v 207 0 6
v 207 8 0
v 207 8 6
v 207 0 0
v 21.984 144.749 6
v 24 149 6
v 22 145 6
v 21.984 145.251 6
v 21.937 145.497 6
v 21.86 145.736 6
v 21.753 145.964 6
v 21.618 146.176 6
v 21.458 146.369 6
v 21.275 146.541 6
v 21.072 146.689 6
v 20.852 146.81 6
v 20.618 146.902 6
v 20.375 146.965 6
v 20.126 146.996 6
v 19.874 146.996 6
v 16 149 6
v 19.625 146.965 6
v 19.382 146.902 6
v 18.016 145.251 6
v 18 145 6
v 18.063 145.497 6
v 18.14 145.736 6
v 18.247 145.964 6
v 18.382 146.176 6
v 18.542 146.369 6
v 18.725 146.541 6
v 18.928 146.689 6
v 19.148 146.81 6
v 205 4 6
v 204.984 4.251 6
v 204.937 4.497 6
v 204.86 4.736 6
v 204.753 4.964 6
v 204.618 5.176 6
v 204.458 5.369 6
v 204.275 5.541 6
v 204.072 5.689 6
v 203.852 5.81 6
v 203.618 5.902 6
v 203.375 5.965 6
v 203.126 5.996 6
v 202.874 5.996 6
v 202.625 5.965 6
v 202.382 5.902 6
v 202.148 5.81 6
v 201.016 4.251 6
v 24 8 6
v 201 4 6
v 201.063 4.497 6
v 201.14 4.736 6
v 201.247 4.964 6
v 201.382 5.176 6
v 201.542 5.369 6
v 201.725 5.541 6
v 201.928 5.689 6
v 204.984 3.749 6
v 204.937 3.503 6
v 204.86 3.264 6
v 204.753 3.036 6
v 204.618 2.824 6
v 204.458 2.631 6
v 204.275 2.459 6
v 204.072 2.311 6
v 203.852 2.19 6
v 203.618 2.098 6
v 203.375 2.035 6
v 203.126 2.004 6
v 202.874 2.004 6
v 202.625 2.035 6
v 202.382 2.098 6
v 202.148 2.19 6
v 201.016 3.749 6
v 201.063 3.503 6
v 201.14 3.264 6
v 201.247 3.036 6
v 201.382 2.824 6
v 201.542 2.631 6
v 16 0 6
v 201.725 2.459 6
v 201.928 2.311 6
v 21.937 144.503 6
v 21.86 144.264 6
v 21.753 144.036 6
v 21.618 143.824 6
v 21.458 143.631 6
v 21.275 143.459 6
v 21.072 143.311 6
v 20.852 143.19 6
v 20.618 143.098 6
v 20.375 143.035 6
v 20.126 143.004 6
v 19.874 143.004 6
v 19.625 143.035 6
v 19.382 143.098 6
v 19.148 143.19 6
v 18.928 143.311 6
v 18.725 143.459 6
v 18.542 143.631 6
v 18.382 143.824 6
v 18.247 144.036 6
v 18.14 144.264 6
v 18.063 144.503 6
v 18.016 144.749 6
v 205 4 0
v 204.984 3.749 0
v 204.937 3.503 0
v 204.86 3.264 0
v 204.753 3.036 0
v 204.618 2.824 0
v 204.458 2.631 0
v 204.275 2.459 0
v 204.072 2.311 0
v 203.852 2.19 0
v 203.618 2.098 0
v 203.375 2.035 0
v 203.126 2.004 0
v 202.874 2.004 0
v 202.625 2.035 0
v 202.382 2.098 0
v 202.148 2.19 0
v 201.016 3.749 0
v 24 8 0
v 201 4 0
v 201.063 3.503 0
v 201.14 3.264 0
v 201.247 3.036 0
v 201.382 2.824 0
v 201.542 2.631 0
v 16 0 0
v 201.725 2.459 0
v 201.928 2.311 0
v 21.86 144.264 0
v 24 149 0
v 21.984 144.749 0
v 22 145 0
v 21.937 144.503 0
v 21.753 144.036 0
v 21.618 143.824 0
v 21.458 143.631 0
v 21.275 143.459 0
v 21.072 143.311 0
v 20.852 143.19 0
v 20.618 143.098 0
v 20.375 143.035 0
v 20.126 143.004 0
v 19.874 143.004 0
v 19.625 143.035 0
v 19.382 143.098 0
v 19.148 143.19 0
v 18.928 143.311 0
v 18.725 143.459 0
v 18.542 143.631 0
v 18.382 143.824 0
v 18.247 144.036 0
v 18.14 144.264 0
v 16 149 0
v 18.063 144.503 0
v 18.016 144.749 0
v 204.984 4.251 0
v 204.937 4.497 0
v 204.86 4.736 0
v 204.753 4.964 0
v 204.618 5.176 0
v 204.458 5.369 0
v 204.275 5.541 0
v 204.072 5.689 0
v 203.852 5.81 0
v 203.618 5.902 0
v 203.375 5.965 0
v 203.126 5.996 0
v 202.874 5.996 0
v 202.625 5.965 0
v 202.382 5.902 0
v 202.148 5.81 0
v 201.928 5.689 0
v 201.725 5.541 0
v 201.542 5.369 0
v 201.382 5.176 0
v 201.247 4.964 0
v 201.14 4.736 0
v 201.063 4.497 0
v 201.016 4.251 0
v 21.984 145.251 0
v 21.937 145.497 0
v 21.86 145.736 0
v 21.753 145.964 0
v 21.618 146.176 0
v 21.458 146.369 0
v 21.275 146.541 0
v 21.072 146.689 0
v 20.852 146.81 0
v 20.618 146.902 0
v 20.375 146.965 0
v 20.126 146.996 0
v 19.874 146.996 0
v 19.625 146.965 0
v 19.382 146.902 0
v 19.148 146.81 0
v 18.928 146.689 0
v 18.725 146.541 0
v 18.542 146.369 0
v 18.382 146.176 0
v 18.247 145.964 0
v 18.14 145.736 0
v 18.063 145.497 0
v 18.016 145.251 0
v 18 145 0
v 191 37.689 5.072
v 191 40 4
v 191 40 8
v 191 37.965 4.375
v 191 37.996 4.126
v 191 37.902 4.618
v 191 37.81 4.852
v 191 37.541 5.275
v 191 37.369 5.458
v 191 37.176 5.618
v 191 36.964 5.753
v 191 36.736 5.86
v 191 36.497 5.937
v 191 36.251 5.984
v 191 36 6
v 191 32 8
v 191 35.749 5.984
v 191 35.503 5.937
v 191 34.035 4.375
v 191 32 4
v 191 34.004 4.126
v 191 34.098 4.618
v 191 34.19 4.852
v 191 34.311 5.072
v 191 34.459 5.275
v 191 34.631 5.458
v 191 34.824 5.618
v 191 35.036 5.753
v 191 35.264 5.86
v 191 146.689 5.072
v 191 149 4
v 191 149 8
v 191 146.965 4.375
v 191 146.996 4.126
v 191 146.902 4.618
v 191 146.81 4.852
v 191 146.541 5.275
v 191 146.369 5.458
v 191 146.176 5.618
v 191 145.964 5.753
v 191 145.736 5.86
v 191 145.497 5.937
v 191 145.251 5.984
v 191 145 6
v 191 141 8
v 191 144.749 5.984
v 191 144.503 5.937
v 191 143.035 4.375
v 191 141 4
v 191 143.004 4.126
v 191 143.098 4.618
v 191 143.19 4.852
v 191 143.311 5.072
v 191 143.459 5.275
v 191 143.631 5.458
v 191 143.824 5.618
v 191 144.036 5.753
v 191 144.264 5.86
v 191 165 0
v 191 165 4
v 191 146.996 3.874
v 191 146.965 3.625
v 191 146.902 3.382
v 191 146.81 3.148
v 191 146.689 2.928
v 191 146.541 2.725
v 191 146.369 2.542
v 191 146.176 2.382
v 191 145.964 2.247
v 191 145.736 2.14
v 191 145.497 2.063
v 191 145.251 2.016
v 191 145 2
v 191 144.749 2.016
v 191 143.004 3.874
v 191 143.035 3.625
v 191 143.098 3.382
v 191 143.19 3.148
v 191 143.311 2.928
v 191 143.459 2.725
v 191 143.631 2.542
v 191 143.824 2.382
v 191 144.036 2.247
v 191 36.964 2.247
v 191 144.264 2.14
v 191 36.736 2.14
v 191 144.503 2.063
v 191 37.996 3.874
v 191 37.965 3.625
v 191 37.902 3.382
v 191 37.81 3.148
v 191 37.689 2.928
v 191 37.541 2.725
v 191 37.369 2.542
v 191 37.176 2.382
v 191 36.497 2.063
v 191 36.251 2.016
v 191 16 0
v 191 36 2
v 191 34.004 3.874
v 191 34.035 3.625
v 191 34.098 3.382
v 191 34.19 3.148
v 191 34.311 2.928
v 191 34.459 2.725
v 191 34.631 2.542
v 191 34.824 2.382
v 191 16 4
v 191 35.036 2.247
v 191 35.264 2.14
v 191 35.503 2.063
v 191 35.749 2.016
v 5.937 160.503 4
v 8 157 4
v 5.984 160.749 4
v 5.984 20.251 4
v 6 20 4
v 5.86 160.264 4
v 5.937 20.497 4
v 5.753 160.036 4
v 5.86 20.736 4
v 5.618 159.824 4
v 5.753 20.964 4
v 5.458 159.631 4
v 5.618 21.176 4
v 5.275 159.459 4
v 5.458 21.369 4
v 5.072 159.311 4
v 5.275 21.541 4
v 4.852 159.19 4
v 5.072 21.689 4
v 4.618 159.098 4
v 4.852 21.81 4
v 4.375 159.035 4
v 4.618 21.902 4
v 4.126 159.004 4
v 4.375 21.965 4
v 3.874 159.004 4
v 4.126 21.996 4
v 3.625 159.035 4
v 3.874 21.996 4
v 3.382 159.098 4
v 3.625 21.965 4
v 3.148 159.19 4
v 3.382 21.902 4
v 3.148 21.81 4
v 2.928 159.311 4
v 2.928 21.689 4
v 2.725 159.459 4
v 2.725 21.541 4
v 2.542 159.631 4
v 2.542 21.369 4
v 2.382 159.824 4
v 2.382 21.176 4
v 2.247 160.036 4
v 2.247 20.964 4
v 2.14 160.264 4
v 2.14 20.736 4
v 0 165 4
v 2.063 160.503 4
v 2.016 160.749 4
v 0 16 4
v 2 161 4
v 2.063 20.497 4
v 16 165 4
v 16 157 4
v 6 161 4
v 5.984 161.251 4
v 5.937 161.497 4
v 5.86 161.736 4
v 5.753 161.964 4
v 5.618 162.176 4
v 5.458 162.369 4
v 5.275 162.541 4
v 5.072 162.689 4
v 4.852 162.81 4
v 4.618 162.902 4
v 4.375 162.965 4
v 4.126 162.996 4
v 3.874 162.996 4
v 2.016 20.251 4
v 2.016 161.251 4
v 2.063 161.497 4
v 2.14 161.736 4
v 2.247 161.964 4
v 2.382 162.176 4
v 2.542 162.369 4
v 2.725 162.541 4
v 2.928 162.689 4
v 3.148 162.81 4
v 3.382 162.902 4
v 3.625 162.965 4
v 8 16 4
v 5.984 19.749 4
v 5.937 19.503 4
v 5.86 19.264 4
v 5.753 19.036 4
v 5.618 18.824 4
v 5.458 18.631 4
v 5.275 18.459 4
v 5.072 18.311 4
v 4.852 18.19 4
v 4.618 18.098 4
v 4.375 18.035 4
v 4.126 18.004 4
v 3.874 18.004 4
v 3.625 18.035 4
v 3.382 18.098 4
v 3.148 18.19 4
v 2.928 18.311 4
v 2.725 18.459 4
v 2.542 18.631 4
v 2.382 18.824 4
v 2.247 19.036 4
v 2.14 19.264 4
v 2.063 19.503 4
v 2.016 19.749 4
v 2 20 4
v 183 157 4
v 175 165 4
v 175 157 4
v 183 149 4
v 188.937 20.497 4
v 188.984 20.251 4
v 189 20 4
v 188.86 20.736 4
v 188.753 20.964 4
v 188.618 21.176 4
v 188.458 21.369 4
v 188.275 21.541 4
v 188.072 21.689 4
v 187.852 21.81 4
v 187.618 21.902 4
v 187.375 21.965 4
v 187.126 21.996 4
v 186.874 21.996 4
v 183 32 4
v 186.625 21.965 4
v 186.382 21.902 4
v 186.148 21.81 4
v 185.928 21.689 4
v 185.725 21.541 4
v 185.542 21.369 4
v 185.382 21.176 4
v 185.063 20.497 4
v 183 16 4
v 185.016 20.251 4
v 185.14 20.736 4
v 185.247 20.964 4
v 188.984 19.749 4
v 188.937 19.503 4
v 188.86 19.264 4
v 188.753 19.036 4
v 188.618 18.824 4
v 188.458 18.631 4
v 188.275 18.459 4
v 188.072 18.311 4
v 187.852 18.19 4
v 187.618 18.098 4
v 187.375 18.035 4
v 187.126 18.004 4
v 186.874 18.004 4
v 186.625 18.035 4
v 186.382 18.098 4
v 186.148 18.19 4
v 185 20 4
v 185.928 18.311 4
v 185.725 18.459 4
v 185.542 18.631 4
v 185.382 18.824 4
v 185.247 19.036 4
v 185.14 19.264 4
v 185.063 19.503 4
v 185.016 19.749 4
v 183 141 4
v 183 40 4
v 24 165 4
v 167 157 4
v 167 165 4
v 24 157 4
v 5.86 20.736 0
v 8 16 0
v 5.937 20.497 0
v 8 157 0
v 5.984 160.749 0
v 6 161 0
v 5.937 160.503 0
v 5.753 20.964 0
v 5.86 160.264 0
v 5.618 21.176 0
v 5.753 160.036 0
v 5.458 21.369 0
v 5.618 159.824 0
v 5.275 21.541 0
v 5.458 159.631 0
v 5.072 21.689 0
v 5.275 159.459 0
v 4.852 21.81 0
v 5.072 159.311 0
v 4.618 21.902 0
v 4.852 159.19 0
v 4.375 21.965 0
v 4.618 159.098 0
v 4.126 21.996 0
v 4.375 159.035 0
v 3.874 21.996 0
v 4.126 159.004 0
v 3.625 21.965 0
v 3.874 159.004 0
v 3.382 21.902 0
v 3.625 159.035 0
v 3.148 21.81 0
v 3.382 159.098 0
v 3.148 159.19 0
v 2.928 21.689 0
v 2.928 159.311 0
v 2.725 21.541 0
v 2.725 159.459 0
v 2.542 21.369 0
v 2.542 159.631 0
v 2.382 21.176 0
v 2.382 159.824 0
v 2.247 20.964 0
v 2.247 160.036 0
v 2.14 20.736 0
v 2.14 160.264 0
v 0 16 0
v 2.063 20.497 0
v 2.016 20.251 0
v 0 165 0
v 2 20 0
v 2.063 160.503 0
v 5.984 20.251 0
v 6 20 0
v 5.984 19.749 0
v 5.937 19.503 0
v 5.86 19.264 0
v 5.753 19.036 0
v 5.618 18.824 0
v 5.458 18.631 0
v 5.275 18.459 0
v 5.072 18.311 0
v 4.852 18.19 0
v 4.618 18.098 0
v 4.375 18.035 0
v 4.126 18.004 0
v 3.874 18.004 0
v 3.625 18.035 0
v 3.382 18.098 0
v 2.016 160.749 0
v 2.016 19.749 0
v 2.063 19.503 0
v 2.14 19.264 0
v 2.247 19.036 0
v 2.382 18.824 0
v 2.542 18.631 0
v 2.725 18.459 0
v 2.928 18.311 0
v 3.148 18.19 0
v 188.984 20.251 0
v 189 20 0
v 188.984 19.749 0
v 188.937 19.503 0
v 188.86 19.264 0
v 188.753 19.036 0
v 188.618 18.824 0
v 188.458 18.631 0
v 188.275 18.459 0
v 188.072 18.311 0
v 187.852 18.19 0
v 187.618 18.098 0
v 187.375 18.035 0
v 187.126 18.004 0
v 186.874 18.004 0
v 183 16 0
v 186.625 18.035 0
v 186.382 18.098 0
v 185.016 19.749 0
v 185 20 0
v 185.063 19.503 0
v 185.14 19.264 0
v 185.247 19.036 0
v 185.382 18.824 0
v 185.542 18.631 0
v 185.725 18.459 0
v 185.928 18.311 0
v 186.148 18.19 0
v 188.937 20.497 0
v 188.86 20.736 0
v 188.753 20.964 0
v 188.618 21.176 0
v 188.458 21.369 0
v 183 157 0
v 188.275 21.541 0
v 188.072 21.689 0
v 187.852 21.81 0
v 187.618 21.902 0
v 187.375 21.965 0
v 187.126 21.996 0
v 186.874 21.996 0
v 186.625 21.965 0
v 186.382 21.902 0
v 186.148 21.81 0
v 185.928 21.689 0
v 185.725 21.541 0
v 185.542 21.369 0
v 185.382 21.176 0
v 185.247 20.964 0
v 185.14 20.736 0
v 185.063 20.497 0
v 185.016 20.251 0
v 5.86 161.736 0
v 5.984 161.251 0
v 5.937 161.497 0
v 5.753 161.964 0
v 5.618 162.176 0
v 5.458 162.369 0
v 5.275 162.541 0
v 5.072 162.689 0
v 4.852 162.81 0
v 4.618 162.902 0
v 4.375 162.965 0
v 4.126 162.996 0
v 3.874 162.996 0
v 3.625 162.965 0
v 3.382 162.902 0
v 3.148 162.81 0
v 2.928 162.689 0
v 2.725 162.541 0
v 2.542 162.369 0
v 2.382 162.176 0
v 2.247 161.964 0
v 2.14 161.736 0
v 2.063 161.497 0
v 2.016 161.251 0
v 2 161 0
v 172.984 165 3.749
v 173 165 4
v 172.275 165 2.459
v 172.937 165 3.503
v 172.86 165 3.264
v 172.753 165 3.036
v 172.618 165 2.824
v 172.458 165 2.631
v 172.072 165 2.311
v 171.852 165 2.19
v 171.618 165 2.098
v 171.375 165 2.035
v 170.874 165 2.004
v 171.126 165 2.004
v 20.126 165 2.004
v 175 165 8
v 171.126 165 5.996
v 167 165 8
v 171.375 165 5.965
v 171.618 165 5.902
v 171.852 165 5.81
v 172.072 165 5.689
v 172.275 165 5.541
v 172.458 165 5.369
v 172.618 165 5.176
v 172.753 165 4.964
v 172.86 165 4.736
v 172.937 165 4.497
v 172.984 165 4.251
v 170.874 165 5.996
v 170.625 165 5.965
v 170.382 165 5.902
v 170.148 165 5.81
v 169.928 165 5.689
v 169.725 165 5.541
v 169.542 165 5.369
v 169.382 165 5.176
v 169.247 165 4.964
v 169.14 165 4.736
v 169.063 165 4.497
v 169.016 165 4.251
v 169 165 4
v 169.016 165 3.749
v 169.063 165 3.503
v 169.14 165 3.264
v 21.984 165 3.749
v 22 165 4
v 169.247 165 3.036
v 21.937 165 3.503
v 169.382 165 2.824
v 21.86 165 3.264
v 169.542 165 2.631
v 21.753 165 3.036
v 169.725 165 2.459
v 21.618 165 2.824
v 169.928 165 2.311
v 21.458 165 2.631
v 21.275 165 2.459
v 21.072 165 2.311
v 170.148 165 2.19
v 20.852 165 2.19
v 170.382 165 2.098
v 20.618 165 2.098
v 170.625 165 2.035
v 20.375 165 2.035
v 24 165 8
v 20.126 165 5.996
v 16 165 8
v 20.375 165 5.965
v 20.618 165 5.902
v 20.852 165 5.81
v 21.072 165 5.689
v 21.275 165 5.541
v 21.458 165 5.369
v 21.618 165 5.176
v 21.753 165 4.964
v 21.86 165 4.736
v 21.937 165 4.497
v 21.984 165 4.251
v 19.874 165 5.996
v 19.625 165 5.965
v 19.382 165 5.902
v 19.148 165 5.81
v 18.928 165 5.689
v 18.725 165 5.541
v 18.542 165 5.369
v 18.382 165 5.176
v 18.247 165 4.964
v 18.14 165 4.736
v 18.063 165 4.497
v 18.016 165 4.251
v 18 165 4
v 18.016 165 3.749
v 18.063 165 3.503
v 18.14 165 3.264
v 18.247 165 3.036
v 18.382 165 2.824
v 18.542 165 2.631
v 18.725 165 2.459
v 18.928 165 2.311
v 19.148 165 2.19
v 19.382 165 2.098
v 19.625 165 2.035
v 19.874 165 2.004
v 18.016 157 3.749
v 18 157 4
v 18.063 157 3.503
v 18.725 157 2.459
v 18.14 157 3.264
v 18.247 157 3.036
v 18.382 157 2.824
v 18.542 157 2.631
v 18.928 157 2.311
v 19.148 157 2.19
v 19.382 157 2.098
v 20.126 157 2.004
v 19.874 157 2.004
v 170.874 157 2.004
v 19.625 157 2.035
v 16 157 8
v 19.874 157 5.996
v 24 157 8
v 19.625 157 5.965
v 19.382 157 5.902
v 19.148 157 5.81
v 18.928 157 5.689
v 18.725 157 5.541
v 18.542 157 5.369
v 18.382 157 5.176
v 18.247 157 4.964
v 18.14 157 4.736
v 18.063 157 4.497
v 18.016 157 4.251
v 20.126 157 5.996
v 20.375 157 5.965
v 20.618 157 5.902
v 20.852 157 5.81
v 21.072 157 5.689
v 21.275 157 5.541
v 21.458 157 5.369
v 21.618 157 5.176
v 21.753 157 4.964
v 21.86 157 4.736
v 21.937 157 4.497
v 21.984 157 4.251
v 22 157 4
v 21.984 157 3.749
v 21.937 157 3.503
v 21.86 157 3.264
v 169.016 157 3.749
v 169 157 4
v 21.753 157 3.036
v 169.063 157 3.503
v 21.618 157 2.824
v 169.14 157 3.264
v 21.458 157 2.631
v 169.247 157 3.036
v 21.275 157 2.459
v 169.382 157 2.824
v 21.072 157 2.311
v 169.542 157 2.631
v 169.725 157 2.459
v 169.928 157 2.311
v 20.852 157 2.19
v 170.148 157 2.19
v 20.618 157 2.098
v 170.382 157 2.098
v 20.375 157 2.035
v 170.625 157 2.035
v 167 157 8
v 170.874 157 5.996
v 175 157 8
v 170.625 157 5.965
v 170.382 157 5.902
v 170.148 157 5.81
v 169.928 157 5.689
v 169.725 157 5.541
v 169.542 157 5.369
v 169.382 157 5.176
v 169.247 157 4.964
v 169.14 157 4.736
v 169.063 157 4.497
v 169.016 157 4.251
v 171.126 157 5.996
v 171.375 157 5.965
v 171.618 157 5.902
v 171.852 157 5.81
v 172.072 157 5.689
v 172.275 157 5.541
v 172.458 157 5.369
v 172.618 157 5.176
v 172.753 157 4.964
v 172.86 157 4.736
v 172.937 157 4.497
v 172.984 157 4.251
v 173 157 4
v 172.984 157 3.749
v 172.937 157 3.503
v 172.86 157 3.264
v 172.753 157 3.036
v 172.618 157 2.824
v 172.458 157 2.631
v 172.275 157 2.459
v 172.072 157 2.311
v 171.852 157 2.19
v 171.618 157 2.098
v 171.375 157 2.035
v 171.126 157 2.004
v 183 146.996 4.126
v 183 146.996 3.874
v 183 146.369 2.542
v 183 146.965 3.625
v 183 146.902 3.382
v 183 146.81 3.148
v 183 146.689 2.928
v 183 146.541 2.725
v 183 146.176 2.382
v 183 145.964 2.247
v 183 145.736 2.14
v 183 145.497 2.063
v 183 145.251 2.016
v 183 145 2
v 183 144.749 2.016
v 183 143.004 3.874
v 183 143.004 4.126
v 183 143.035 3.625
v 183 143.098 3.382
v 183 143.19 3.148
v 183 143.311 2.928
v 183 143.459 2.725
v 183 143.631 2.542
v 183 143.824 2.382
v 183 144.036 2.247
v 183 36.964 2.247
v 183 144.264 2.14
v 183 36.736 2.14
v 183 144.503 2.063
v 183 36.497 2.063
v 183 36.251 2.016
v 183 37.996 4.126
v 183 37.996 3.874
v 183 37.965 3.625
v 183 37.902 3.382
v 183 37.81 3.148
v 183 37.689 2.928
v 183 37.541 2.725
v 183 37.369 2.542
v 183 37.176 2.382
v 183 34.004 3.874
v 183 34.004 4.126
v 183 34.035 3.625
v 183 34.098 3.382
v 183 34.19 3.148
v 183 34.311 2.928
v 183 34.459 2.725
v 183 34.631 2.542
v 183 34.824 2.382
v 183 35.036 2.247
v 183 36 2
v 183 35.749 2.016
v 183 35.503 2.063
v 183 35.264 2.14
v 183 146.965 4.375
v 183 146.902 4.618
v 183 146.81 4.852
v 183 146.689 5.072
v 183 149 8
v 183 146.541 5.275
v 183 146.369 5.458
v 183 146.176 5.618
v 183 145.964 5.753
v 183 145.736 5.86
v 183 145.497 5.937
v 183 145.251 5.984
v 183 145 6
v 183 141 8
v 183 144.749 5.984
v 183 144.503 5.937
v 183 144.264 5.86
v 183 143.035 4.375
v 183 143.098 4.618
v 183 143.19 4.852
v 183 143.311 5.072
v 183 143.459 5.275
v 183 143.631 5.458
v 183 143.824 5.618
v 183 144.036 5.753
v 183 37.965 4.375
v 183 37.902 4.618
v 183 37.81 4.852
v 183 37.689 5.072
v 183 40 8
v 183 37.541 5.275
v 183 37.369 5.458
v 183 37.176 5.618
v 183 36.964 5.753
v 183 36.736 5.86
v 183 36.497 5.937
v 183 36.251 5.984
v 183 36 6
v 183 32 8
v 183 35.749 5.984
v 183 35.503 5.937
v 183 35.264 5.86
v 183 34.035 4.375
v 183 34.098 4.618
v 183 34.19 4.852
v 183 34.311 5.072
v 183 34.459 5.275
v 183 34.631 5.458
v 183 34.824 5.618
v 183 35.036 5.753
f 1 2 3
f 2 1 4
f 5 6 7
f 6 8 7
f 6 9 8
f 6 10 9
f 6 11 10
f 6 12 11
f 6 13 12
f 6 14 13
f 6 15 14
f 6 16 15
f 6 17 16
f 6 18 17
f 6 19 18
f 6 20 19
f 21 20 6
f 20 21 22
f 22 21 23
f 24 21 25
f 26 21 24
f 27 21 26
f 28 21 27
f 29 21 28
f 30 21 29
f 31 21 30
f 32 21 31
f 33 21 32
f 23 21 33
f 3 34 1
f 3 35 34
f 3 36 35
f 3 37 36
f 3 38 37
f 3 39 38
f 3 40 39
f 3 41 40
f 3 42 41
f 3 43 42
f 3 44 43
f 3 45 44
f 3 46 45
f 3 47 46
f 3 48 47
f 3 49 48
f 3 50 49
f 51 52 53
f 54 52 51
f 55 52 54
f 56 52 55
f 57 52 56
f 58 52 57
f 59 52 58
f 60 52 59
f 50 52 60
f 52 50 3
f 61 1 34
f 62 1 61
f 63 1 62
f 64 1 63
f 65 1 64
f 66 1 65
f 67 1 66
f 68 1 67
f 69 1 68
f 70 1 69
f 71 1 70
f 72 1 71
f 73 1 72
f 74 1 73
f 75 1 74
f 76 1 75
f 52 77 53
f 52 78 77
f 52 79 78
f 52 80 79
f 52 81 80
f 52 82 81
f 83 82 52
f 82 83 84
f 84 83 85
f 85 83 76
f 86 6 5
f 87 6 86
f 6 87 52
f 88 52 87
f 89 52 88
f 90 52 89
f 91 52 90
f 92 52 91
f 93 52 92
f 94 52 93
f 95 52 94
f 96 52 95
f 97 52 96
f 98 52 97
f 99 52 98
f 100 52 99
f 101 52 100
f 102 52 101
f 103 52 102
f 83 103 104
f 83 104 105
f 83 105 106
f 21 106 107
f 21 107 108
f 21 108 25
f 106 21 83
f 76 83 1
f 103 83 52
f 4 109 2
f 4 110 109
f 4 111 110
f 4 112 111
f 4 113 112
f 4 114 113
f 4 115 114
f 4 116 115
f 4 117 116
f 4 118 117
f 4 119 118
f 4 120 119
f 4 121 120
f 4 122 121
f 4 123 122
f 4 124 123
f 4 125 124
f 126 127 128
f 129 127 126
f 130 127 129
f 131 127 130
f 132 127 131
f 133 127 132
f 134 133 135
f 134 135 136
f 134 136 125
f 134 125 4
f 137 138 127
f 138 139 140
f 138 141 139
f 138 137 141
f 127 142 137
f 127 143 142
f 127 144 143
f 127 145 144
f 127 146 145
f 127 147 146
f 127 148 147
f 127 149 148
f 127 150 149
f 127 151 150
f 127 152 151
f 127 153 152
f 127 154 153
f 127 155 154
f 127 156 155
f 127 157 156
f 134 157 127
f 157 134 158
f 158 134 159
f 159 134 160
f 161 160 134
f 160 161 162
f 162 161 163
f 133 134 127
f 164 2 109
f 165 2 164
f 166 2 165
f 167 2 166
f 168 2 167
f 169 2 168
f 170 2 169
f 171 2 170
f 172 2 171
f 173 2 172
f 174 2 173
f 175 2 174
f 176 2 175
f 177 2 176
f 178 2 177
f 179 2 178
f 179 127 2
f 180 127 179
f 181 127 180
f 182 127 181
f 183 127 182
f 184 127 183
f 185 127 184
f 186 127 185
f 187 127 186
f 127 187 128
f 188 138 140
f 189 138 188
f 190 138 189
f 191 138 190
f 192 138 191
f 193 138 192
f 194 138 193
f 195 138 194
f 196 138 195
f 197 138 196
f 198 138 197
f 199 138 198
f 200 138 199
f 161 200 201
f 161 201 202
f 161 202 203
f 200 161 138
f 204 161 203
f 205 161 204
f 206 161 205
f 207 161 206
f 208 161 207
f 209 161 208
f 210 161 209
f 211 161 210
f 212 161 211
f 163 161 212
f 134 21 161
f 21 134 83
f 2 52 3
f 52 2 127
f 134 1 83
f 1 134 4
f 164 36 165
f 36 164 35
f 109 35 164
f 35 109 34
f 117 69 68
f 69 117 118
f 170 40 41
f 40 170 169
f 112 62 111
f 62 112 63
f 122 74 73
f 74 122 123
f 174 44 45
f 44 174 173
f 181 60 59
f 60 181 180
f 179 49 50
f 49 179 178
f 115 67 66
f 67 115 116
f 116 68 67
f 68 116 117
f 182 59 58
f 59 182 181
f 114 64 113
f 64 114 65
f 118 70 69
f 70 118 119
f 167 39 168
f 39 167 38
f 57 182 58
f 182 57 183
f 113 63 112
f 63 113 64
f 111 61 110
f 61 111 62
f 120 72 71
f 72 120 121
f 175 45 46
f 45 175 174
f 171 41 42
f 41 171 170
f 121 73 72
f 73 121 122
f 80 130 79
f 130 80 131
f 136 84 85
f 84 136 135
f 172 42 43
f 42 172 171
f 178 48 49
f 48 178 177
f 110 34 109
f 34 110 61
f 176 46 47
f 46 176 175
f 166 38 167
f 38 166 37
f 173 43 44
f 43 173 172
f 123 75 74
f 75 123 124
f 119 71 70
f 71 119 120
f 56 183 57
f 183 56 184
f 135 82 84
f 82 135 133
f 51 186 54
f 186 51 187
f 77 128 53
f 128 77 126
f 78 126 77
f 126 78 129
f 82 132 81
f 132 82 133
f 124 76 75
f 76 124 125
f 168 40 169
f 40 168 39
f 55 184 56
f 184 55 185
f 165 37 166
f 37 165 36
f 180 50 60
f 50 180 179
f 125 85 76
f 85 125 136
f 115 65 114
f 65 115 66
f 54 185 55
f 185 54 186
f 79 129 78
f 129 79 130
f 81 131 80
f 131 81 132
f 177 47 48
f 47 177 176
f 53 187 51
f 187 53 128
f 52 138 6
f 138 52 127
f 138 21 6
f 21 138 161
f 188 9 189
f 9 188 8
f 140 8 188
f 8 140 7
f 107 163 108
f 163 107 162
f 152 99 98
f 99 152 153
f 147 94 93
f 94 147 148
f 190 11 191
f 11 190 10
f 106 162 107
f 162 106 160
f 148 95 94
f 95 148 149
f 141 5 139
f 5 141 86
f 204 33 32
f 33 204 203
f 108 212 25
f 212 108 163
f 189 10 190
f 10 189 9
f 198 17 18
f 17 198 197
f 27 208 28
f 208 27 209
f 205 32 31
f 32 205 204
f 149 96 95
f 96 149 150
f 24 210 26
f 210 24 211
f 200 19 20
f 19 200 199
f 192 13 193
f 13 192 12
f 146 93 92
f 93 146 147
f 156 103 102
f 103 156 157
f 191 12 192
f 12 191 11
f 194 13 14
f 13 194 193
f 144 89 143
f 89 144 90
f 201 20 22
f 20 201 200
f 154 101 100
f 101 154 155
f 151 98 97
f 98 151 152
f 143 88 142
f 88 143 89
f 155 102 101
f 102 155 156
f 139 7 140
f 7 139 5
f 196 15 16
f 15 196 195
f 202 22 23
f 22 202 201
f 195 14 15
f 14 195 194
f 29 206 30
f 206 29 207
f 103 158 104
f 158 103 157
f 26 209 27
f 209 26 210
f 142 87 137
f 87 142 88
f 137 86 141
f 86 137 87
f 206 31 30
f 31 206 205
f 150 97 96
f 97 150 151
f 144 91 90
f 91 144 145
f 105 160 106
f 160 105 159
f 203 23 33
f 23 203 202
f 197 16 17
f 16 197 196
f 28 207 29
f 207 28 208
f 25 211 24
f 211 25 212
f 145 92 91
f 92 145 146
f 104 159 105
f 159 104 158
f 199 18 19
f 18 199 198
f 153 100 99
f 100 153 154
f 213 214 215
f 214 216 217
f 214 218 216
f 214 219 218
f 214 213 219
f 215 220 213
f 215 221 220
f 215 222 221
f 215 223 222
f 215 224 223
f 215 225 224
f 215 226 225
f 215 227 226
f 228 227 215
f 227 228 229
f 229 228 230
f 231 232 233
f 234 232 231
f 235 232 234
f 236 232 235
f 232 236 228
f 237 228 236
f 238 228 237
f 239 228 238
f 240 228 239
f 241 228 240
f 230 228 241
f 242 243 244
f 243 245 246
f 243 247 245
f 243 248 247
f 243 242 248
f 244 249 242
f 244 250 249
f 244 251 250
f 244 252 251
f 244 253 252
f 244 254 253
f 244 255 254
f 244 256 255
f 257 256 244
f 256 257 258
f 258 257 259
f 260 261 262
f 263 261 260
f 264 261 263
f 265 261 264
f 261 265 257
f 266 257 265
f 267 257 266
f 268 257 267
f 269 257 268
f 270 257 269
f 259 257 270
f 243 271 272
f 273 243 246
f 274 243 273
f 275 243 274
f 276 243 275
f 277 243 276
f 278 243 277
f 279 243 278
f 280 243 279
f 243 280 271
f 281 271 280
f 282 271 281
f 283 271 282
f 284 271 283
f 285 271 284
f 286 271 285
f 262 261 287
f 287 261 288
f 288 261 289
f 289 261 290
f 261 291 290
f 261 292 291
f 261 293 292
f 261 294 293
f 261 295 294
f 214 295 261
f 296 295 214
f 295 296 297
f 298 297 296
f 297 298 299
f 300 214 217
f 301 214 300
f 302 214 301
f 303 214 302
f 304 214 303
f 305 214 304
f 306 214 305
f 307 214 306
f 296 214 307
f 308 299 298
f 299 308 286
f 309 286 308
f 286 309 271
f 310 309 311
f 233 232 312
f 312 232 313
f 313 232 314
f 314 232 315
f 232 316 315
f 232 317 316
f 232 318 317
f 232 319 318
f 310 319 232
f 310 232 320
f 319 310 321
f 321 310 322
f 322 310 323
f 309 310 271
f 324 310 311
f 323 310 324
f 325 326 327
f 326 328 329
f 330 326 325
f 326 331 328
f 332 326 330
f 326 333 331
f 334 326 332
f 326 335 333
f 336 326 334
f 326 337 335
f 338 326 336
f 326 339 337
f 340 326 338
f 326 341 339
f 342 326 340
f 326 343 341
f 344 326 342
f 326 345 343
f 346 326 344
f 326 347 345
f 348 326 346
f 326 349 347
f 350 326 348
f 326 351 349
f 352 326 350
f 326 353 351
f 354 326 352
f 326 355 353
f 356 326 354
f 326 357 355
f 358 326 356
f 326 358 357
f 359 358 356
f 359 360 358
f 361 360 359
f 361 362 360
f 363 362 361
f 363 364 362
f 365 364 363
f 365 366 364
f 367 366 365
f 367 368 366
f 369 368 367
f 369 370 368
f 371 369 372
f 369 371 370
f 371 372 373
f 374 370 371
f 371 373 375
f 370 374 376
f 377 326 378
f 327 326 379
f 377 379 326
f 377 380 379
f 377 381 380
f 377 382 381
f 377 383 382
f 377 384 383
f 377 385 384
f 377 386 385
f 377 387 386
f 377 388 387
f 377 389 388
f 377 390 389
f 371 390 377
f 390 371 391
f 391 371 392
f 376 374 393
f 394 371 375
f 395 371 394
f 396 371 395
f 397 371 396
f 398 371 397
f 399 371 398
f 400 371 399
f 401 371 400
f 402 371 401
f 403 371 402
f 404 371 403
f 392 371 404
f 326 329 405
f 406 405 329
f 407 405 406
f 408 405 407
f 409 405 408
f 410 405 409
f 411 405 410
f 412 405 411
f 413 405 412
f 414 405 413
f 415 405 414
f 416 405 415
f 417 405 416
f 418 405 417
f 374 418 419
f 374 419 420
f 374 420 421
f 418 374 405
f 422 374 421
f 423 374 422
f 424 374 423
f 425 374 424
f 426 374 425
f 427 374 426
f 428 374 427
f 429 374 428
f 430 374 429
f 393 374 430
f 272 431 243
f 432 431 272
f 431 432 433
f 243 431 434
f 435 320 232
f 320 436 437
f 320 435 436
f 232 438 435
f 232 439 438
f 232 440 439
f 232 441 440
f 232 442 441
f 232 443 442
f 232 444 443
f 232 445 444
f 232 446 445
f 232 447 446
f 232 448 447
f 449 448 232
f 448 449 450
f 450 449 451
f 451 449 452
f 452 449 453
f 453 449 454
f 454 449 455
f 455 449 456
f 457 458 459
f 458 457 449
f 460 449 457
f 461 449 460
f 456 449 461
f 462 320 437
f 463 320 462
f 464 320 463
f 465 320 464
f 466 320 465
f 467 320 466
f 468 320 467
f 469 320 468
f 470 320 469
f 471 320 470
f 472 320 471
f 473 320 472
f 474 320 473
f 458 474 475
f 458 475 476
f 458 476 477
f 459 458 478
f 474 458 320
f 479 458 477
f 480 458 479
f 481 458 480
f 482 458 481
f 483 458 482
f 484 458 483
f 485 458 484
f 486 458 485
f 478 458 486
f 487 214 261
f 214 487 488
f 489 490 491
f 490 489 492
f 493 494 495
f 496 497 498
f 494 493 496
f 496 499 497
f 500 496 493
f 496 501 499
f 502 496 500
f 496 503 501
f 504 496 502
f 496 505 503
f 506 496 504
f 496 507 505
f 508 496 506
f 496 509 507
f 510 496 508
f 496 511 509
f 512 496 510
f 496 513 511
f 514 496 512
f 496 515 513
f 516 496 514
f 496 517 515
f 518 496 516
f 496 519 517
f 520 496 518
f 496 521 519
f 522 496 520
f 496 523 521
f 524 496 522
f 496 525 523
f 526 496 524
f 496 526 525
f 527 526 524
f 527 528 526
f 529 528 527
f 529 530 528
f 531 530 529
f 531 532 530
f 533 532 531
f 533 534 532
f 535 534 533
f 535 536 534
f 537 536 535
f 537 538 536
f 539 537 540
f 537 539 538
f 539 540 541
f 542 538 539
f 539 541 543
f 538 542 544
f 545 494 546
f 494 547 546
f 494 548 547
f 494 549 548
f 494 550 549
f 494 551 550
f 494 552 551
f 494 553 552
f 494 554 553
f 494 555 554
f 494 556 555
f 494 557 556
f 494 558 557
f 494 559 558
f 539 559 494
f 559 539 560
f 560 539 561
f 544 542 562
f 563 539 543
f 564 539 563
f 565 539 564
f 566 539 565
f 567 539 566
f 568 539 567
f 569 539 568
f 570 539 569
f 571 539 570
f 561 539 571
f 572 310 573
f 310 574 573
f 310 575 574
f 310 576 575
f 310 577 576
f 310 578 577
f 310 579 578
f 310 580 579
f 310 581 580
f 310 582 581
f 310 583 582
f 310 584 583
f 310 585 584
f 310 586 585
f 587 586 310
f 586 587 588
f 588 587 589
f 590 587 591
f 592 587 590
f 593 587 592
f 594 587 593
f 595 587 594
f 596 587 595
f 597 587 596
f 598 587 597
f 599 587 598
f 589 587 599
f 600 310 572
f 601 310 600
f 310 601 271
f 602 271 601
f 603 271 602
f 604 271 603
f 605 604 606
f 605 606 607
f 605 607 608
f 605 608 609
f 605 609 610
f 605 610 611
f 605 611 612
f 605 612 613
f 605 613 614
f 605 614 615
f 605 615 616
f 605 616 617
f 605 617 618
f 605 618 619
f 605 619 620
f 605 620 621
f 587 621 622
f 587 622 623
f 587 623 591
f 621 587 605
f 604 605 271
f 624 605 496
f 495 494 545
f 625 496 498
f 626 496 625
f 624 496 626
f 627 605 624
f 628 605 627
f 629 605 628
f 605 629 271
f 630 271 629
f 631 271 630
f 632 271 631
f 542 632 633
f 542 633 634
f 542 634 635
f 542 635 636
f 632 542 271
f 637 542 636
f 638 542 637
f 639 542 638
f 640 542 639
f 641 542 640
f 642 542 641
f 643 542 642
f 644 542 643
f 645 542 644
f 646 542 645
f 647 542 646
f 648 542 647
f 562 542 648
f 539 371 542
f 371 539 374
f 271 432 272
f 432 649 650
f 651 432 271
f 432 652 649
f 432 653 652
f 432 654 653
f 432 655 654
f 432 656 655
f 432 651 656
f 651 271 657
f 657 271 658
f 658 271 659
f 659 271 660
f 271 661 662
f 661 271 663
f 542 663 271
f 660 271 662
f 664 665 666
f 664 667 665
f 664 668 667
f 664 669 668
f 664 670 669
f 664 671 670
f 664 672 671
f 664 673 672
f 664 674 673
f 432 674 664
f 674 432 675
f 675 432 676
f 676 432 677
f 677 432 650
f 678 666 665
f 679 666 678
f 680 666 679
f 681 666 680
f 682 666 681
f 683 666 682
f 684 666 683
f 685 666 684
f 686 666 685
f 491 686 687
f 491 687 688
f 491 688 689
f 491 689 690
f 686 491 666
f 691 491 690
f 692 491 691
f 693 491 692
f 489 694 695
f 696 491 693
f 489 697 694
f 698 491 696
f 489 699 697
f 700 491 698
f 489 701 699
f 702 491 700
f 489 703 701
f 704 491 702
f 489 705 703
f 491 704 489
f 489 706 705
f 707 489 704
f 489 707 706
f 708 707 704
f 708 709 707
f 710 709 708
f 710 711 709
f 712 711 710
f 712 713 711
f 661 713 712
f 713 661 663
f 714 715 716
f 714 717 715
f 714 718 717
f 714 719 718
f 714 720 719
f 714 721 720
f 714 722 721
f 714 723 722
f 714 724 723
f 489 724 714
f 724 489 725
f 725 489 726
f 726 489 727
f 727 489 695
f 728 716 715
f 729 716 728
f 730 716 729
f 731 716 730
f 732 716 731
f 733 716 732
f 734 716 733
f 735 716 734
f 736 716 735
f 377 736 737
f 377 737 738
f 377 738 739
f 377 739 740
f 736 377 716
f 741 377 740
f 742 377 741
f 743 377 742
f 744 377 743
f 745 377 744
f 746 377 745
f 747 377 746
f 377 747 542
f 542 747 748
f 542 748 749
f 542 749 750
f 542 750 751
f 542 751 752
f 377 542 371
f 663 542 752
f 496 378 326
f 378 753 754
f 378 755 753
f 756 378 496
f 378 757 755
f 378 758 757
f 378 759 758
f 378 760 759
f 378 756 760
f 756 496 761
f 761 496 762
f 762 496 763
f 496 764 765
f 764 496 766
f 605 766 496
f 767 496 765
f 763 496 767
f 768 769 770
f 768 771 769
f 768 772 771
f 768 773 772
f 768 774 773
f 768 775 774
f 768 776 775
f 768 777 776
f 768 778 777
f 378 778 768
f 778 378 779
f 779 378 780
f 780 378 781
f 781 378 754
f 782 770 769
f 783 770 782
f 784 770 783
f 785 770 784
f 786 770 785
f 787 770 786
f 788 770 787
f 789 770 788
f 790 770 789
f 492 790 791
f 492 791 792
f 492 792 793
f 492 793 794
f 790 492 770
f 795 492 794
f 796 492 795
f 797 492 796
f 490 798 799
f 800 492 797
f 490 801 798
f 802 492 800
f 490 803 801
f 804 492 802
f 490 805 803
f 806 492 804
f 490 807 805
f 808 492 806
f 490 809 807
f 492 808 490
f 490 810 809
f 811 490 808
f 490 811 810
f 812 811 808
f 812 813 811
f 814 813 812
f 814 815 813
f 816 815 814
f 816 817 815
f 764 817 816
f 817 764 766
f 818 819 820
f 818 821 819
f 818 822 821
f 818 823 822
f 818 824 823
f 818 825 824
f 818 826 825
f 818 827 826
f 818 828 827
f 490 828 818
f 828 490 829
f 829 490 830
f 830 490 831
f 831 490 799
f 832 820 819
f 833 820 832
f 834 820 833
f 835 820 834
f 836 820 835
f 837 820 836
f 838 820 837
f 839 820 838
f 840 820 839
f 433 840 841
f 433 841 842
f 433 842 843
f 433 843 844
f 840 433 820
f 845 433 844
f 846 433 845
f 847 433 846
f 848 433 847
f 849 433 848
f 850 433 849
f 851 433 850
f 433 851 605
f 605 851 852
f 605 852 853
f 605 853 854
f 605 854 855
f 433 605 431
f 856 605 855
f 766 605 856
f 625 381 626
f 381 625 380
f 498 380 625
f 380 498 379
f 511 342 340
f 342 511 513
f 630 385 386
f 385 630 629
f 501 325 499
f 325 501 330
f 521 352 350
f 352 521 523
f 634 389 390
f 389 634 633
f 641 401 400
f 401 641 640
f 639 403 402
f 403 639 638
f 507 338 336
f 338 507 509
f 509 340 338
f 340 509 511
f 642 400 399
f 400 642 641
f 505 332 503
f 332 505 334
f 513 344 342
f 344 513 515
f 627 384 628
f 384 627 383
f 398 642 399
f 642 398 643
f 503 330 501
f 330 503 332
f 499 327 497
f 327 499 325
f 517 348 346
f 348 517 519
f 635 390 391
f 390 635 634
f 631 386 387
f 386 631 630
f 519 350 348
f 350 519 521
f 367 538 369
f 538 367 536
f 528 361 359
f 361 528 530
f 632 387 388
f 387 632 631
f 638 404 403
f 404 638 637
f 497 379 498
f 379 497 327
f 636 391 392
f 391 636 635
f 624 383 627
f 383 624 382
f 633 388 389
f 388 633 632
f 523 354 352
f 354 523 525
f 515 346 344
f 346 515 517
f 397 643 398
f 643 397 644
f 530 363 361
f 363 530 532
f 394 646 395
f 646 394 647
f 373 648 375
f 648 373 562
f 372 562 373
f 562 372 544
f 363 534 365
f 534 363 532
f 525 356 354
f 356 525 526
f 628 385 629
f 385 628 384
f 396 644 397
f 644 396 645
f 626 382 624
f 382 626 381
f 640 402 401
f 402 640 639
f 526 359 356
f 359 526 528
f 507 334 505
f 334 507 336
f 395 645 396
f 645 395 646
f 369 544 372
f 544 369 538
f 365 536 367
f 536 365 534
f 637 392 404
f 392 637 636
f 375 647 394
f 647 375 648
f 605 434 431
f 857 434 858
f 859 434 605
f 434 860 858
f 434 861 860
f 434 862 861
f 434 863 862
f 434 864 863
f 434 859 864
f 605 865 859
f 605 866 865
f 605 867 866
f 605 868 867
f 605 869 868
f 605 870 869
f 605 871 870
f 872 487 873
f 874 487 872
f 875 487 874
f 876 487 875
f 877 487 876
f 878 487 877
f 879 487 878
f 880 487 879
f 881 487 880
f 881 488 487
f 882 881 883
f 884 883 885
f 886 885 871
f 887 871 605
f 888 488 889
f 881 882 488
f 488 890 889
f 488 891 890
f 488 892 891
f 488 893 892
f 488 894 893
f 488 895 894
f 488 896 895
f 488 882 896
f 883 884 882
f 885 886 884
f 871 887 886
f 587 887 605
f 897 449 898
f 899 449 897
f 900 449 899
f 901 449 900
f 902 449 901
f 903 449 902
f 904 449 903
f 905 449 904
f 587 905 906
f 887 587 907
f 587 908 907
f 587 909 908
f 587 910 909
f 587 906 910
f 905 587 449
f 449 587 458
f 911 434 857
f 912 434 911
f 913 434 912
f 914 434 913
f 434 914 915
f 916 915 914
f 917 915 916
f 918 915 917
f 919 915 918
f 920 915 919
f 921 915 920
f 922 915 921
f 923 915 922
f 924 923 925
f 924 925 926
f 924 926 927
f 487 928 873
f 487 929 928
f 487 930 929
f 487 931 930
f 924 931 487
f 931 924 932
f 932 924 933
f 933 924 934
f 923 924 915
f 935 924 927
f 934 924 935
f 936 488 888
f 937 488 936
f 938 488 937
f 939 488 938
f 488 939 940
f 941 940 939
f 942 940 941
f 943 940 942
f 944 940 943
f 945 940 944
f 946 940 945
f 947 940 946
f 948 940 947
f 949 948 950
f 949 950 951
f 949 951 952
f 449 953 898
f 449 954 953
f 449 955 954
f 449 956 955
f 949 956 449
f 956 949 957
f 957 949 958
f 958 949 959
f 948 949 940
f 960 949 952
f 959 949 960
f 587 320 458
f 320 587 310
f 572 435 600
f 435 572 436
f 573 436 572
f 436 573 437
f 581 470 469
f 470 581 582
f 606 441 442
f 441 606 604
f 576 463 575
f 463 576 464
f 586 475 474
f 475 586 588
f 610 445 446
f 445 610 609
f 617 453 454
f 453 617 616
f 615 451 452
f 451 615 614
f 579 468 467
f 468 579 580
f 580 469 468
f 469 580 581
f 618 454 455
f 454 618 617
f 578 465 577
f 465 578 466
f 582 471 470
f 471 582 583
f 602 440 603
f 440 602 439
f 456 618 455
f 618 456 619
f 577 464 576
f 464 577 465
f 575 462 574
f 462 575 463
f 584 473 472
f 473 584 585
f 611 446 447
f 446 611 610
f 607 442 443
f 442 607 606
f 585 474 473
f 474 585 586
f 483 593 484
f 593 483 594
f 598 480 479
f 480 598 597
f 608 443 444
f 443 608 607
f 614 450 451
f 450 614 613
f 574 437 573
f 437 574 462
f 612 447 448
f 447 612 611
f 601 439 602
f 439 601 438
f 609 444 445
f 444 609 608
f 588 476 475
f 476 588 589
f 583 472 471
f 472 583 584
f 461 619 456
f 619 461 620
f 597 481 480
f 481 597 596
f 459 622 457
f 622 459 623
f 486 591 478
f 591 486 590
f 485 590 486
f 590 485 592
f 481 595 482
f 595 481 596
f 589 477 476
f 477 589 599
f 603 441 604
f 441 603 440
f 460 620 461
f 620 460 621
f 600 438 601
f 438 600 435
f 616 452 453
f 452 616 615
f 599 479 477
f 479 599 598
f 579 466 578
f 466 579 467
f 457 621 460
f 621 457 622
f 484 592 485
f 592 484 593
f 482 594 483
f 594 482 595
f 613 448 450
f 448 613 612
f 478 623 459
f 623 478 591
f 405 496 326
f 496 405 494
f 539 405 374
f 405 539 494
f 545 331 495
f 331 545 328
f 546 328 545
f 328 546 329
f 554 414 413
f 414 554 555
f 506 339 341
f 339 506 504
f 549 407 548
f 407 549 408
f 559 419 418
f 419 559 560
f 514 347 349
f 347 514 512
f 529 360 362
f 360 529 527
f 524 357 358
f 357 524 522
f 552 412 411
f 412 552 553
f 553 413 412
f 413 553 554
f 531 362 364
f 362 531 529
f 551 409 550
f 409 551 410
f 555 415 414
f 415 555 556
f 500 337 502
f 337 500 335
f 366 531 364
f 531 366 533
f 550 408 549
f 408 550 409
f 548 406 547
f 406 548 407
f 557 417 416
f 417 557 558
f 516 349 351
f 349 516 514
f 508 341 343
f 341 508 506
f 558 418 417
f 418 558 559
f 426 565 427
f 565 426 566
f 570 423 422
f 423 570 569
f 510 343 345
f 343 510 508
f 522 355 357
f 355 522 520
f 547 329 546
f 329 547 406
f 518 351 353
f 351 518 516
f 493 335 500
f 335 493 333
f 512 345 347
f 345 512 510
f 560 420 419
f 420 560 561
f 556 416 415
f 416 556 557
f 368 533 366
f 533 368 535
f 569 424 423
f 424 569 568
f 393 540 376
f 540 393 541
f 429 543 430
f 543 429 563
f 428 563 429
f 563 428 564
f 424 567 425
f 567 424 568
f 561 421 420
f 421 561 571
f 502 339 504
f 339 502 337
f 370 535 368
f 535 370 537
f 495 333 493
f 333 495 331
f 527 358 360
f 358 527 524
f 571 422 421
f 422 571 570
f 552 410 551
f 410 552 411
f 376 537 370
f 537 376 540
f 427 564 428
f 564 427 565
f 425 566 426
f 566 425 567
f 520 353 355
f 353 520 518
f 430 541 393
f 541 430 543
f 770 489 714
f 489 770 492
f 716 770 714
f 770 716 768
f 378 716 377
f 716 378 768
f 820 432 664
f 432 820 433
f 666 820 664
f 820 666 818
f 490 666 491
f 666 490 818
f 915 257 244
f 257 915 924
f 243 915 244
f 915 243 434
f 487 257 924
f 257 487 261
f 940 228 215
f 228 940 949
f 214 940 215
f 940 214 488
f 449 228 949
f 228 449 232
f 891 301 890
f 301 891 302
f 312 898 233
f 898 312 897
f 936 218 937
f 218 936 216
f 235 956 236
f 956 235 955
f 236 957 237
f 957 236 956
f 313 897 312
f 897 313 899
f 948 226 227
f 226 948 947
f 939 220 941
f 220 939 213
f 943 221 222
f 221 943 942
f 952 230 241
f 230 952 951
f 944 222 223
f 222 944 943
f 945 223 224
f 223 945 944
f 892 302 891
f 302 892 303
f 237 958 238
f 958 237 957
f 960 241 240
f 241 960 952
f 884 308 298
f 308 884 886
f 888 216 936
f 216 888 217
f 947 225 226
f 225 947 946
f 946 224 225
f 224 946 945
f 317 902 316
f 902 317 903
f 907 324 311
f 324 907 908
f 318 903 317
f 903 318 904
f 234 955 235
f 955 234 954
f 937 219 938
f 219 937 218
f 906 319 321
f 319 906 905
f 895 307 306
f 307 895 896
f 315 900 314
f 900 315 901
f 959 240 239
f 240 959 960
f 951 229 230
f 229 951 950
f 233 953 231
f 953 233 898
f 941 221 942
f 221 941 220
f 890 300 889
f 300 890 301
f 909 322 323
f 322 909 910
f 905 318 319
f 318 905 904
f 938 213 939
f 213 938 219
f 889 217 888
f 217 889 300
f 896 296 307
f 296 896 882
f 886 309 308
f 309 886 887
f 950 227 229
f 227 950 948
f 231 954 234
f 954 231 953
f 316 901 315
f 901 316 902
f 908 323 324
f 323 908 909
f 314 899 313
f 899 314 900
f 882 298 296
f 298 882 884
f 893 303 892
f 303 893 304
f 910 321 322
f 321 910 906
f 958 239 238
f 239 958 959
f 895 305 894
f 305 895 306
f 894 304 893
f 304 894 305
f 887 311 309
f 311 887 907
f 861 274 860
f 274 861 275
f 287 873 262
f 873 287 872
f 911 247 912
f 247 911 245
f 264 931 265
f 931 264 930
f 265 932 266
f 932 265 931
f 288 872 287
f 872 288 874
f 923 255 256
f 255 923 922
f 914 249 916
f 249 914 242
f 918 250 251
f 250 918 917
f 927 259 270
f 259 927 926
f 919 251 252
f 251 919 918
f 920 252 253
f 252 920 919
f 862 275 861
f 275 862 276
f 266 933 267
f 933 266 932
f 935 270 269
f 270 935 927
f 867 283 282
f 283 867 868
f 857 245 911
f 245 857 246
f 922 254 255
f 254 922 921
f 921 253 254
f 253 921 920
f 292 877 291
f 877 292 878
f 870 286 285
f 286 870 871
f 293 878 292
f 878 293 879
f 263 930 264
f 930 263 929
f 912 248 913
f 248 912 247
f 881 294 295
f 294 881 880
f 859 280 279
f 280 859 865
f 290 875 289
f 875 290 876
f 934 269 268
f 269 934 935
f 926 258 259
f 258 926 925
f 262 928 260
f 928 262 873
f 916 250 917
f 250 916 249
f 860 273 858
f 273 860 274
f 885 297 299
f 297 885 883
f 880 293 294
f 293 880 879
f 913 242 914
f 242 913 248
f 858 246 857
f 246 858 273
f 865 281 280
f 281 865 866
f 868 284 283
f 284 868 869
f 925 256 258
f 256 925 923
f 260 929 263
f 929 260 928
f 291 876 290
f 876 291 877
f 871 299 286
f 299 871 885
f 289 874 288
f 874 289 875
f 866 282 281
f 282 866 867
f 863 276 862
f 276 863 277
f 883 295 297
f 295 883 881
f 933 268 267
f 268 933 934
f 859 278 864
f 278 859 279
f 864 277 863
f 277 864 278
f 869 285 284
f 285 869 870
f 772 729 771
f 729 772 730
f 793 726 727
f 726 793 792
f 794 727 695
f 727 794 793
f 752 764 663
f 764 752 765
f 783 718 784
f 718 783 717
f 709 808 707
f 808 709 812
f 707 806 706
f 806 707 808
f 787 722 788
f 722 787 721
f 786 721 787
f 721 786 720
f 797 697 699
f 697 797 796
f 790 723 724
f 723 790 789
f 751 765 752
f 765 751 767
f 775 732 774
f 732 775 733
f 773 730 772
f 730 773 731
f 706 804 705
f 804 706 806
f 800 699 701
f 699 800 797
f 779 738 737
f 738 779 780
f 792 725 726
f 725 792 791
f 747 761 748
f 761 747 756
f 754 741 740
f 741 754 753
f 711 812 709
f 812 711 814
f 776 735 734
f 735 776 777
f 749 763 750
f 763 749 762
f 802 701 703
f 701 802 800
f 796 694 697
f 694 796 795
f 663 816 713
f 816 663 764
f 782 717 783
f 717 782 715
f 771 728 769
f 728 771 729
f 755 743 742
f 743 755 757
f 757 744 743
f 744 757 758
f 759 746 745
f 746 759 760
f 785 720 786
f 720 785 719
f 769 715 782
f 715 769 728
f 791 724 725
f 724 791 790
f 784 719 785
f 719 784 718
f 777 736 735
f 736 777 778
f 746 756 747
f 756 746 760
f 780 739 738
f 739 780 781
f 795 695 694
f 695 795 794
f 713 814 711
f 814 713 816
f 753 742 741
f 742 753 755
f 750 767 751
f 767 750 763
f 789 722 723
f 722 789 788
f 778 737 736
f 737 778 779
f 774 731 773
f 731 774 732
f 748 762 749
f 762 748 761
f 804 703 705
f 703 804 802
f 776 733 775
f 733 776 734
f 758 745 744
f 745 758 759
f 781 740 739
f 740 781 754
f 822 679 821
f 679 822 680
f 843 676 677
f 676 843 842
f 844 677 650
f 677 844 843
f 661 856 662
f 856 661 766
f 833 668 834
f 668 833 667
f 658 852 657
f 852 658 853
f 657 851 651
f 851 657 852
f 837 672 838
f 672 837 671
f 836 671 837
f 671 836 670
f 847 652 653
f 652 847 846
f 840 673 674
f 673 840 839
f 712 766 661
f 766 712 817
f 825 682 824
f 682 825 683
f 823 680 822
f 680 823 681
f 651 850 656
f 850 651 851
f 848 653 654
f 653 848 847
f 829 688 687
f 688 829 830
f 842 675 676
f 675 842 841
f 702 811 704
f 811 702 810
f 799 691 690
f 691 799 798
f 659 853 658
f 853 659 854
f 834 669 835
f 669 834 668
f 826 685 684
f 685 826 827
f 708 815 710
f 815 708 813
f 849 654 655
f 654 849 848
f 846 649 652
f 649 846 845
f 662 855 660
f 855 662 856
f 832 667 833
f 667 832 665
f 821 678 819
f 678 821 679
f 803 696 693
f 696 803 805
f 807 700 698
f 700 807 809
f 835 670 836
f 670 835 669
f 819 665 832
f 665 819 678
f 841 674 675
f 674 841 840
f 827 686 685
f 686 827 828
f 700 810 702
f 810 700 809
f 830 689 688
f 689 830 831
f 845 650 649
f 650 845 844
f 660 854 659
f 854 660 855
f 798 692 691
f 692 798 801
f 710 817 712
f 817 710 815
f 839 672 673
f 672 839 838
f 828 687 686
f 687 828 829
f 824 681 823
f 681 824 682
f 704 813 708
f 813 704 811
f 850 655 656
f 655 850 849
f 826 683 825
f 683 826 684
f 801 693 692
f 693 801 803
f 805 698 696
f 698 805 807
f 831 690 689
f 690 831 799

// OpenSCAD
$fn=50;

lcd_x = 183;
lcd_y = 141;
lcd_z = 6;

wall_w = 8;
wall_n = 4;
screw = 4;

module lcd() {
    color([0,0.5,0,0.5]) cube([lcd_x, lcd_y, lcd_z]);
}

module short(z = lcd_z) {
    cube([wall_w, lcd_y+wall_w, z]);
}

module long(z = lcd_z) {
    cube([lcd_x+wall_w, wall_w, z]);
}

module screwhole(z = lcd_z) {
    cylinder(d1=screw,d2=screw,h=z);
}

module screw() {
    cube([wall_w,wall_w,wall_w]);
}

module mount() {
  difference() {
    union() {
    difference() {
        translate([0, lcd_y, 0]) long(wall_n);
        translate([wall_w/2, wall_w/2+lcd_y, 0]) screwhole(wall_n);
    }
    difference() {
        translate([lcd_x, 0, 0]) short(wall_n);
        translate([wall_w/2+lcd_x, wall_w/2, 0]) screwhole(wall_n);
    }
    difference() {
        short(wall_n);
        translate([wall_w/2, wall_w/2+lcd_y, 0]) screwhole(wall_n);
        translate([wall_w/2, wall_w/2, 0]) screwhole(wall_n);
    }
    translate([2*wall_w,lcd_y,0]) screw();
    translate([lcd_x-2*wall_w,lcd_y,0]) screw();
    translate([lcd_x,lcd_y-2*wall_w,0]) screw();
    translate([lcd_x,2*wall_w,0]) screw();
    }
    translate([wall_w+lcd_x,wall_w/2+2*wall_w,wall_w/2]) rotate([0,-90,0]) screwhole(wall_w);
    translate([wall_w+lcd_x,wall_w/2+lcd_y-2*wall_w,wall_w/2]) rotate([0,-90,0]) screwhole(wall_w);
    translate([2*wall_w+wall_w/2,lcd_y+wall_w,wall_w/2]) rotate([90,0,0]) screwhole(wall_w);
    translate([lcd_x-wall_w-wall_w/2,lcd_y+wall_w,wall_w/2]) rotate([90,0,0]) screwhole(wall_w);
  }
}

module holder() {
    difference() {
        long(lcd_z);
        translate([wall_w/2+lcd_x, wall_w/2, 0]) screwhole(lcd_z);
    }
    difference() {
        short(lcd_z);
        translate([wall_w/2, wall_w/2+lcd_y, 0]) screwhole(lcd_z);
    }
}

translate([2*wall_w,0,0]) holder();
translate([0,2*wall_w,0]) mount();

//translate([wall_w,wall_w,0]) lcd();
